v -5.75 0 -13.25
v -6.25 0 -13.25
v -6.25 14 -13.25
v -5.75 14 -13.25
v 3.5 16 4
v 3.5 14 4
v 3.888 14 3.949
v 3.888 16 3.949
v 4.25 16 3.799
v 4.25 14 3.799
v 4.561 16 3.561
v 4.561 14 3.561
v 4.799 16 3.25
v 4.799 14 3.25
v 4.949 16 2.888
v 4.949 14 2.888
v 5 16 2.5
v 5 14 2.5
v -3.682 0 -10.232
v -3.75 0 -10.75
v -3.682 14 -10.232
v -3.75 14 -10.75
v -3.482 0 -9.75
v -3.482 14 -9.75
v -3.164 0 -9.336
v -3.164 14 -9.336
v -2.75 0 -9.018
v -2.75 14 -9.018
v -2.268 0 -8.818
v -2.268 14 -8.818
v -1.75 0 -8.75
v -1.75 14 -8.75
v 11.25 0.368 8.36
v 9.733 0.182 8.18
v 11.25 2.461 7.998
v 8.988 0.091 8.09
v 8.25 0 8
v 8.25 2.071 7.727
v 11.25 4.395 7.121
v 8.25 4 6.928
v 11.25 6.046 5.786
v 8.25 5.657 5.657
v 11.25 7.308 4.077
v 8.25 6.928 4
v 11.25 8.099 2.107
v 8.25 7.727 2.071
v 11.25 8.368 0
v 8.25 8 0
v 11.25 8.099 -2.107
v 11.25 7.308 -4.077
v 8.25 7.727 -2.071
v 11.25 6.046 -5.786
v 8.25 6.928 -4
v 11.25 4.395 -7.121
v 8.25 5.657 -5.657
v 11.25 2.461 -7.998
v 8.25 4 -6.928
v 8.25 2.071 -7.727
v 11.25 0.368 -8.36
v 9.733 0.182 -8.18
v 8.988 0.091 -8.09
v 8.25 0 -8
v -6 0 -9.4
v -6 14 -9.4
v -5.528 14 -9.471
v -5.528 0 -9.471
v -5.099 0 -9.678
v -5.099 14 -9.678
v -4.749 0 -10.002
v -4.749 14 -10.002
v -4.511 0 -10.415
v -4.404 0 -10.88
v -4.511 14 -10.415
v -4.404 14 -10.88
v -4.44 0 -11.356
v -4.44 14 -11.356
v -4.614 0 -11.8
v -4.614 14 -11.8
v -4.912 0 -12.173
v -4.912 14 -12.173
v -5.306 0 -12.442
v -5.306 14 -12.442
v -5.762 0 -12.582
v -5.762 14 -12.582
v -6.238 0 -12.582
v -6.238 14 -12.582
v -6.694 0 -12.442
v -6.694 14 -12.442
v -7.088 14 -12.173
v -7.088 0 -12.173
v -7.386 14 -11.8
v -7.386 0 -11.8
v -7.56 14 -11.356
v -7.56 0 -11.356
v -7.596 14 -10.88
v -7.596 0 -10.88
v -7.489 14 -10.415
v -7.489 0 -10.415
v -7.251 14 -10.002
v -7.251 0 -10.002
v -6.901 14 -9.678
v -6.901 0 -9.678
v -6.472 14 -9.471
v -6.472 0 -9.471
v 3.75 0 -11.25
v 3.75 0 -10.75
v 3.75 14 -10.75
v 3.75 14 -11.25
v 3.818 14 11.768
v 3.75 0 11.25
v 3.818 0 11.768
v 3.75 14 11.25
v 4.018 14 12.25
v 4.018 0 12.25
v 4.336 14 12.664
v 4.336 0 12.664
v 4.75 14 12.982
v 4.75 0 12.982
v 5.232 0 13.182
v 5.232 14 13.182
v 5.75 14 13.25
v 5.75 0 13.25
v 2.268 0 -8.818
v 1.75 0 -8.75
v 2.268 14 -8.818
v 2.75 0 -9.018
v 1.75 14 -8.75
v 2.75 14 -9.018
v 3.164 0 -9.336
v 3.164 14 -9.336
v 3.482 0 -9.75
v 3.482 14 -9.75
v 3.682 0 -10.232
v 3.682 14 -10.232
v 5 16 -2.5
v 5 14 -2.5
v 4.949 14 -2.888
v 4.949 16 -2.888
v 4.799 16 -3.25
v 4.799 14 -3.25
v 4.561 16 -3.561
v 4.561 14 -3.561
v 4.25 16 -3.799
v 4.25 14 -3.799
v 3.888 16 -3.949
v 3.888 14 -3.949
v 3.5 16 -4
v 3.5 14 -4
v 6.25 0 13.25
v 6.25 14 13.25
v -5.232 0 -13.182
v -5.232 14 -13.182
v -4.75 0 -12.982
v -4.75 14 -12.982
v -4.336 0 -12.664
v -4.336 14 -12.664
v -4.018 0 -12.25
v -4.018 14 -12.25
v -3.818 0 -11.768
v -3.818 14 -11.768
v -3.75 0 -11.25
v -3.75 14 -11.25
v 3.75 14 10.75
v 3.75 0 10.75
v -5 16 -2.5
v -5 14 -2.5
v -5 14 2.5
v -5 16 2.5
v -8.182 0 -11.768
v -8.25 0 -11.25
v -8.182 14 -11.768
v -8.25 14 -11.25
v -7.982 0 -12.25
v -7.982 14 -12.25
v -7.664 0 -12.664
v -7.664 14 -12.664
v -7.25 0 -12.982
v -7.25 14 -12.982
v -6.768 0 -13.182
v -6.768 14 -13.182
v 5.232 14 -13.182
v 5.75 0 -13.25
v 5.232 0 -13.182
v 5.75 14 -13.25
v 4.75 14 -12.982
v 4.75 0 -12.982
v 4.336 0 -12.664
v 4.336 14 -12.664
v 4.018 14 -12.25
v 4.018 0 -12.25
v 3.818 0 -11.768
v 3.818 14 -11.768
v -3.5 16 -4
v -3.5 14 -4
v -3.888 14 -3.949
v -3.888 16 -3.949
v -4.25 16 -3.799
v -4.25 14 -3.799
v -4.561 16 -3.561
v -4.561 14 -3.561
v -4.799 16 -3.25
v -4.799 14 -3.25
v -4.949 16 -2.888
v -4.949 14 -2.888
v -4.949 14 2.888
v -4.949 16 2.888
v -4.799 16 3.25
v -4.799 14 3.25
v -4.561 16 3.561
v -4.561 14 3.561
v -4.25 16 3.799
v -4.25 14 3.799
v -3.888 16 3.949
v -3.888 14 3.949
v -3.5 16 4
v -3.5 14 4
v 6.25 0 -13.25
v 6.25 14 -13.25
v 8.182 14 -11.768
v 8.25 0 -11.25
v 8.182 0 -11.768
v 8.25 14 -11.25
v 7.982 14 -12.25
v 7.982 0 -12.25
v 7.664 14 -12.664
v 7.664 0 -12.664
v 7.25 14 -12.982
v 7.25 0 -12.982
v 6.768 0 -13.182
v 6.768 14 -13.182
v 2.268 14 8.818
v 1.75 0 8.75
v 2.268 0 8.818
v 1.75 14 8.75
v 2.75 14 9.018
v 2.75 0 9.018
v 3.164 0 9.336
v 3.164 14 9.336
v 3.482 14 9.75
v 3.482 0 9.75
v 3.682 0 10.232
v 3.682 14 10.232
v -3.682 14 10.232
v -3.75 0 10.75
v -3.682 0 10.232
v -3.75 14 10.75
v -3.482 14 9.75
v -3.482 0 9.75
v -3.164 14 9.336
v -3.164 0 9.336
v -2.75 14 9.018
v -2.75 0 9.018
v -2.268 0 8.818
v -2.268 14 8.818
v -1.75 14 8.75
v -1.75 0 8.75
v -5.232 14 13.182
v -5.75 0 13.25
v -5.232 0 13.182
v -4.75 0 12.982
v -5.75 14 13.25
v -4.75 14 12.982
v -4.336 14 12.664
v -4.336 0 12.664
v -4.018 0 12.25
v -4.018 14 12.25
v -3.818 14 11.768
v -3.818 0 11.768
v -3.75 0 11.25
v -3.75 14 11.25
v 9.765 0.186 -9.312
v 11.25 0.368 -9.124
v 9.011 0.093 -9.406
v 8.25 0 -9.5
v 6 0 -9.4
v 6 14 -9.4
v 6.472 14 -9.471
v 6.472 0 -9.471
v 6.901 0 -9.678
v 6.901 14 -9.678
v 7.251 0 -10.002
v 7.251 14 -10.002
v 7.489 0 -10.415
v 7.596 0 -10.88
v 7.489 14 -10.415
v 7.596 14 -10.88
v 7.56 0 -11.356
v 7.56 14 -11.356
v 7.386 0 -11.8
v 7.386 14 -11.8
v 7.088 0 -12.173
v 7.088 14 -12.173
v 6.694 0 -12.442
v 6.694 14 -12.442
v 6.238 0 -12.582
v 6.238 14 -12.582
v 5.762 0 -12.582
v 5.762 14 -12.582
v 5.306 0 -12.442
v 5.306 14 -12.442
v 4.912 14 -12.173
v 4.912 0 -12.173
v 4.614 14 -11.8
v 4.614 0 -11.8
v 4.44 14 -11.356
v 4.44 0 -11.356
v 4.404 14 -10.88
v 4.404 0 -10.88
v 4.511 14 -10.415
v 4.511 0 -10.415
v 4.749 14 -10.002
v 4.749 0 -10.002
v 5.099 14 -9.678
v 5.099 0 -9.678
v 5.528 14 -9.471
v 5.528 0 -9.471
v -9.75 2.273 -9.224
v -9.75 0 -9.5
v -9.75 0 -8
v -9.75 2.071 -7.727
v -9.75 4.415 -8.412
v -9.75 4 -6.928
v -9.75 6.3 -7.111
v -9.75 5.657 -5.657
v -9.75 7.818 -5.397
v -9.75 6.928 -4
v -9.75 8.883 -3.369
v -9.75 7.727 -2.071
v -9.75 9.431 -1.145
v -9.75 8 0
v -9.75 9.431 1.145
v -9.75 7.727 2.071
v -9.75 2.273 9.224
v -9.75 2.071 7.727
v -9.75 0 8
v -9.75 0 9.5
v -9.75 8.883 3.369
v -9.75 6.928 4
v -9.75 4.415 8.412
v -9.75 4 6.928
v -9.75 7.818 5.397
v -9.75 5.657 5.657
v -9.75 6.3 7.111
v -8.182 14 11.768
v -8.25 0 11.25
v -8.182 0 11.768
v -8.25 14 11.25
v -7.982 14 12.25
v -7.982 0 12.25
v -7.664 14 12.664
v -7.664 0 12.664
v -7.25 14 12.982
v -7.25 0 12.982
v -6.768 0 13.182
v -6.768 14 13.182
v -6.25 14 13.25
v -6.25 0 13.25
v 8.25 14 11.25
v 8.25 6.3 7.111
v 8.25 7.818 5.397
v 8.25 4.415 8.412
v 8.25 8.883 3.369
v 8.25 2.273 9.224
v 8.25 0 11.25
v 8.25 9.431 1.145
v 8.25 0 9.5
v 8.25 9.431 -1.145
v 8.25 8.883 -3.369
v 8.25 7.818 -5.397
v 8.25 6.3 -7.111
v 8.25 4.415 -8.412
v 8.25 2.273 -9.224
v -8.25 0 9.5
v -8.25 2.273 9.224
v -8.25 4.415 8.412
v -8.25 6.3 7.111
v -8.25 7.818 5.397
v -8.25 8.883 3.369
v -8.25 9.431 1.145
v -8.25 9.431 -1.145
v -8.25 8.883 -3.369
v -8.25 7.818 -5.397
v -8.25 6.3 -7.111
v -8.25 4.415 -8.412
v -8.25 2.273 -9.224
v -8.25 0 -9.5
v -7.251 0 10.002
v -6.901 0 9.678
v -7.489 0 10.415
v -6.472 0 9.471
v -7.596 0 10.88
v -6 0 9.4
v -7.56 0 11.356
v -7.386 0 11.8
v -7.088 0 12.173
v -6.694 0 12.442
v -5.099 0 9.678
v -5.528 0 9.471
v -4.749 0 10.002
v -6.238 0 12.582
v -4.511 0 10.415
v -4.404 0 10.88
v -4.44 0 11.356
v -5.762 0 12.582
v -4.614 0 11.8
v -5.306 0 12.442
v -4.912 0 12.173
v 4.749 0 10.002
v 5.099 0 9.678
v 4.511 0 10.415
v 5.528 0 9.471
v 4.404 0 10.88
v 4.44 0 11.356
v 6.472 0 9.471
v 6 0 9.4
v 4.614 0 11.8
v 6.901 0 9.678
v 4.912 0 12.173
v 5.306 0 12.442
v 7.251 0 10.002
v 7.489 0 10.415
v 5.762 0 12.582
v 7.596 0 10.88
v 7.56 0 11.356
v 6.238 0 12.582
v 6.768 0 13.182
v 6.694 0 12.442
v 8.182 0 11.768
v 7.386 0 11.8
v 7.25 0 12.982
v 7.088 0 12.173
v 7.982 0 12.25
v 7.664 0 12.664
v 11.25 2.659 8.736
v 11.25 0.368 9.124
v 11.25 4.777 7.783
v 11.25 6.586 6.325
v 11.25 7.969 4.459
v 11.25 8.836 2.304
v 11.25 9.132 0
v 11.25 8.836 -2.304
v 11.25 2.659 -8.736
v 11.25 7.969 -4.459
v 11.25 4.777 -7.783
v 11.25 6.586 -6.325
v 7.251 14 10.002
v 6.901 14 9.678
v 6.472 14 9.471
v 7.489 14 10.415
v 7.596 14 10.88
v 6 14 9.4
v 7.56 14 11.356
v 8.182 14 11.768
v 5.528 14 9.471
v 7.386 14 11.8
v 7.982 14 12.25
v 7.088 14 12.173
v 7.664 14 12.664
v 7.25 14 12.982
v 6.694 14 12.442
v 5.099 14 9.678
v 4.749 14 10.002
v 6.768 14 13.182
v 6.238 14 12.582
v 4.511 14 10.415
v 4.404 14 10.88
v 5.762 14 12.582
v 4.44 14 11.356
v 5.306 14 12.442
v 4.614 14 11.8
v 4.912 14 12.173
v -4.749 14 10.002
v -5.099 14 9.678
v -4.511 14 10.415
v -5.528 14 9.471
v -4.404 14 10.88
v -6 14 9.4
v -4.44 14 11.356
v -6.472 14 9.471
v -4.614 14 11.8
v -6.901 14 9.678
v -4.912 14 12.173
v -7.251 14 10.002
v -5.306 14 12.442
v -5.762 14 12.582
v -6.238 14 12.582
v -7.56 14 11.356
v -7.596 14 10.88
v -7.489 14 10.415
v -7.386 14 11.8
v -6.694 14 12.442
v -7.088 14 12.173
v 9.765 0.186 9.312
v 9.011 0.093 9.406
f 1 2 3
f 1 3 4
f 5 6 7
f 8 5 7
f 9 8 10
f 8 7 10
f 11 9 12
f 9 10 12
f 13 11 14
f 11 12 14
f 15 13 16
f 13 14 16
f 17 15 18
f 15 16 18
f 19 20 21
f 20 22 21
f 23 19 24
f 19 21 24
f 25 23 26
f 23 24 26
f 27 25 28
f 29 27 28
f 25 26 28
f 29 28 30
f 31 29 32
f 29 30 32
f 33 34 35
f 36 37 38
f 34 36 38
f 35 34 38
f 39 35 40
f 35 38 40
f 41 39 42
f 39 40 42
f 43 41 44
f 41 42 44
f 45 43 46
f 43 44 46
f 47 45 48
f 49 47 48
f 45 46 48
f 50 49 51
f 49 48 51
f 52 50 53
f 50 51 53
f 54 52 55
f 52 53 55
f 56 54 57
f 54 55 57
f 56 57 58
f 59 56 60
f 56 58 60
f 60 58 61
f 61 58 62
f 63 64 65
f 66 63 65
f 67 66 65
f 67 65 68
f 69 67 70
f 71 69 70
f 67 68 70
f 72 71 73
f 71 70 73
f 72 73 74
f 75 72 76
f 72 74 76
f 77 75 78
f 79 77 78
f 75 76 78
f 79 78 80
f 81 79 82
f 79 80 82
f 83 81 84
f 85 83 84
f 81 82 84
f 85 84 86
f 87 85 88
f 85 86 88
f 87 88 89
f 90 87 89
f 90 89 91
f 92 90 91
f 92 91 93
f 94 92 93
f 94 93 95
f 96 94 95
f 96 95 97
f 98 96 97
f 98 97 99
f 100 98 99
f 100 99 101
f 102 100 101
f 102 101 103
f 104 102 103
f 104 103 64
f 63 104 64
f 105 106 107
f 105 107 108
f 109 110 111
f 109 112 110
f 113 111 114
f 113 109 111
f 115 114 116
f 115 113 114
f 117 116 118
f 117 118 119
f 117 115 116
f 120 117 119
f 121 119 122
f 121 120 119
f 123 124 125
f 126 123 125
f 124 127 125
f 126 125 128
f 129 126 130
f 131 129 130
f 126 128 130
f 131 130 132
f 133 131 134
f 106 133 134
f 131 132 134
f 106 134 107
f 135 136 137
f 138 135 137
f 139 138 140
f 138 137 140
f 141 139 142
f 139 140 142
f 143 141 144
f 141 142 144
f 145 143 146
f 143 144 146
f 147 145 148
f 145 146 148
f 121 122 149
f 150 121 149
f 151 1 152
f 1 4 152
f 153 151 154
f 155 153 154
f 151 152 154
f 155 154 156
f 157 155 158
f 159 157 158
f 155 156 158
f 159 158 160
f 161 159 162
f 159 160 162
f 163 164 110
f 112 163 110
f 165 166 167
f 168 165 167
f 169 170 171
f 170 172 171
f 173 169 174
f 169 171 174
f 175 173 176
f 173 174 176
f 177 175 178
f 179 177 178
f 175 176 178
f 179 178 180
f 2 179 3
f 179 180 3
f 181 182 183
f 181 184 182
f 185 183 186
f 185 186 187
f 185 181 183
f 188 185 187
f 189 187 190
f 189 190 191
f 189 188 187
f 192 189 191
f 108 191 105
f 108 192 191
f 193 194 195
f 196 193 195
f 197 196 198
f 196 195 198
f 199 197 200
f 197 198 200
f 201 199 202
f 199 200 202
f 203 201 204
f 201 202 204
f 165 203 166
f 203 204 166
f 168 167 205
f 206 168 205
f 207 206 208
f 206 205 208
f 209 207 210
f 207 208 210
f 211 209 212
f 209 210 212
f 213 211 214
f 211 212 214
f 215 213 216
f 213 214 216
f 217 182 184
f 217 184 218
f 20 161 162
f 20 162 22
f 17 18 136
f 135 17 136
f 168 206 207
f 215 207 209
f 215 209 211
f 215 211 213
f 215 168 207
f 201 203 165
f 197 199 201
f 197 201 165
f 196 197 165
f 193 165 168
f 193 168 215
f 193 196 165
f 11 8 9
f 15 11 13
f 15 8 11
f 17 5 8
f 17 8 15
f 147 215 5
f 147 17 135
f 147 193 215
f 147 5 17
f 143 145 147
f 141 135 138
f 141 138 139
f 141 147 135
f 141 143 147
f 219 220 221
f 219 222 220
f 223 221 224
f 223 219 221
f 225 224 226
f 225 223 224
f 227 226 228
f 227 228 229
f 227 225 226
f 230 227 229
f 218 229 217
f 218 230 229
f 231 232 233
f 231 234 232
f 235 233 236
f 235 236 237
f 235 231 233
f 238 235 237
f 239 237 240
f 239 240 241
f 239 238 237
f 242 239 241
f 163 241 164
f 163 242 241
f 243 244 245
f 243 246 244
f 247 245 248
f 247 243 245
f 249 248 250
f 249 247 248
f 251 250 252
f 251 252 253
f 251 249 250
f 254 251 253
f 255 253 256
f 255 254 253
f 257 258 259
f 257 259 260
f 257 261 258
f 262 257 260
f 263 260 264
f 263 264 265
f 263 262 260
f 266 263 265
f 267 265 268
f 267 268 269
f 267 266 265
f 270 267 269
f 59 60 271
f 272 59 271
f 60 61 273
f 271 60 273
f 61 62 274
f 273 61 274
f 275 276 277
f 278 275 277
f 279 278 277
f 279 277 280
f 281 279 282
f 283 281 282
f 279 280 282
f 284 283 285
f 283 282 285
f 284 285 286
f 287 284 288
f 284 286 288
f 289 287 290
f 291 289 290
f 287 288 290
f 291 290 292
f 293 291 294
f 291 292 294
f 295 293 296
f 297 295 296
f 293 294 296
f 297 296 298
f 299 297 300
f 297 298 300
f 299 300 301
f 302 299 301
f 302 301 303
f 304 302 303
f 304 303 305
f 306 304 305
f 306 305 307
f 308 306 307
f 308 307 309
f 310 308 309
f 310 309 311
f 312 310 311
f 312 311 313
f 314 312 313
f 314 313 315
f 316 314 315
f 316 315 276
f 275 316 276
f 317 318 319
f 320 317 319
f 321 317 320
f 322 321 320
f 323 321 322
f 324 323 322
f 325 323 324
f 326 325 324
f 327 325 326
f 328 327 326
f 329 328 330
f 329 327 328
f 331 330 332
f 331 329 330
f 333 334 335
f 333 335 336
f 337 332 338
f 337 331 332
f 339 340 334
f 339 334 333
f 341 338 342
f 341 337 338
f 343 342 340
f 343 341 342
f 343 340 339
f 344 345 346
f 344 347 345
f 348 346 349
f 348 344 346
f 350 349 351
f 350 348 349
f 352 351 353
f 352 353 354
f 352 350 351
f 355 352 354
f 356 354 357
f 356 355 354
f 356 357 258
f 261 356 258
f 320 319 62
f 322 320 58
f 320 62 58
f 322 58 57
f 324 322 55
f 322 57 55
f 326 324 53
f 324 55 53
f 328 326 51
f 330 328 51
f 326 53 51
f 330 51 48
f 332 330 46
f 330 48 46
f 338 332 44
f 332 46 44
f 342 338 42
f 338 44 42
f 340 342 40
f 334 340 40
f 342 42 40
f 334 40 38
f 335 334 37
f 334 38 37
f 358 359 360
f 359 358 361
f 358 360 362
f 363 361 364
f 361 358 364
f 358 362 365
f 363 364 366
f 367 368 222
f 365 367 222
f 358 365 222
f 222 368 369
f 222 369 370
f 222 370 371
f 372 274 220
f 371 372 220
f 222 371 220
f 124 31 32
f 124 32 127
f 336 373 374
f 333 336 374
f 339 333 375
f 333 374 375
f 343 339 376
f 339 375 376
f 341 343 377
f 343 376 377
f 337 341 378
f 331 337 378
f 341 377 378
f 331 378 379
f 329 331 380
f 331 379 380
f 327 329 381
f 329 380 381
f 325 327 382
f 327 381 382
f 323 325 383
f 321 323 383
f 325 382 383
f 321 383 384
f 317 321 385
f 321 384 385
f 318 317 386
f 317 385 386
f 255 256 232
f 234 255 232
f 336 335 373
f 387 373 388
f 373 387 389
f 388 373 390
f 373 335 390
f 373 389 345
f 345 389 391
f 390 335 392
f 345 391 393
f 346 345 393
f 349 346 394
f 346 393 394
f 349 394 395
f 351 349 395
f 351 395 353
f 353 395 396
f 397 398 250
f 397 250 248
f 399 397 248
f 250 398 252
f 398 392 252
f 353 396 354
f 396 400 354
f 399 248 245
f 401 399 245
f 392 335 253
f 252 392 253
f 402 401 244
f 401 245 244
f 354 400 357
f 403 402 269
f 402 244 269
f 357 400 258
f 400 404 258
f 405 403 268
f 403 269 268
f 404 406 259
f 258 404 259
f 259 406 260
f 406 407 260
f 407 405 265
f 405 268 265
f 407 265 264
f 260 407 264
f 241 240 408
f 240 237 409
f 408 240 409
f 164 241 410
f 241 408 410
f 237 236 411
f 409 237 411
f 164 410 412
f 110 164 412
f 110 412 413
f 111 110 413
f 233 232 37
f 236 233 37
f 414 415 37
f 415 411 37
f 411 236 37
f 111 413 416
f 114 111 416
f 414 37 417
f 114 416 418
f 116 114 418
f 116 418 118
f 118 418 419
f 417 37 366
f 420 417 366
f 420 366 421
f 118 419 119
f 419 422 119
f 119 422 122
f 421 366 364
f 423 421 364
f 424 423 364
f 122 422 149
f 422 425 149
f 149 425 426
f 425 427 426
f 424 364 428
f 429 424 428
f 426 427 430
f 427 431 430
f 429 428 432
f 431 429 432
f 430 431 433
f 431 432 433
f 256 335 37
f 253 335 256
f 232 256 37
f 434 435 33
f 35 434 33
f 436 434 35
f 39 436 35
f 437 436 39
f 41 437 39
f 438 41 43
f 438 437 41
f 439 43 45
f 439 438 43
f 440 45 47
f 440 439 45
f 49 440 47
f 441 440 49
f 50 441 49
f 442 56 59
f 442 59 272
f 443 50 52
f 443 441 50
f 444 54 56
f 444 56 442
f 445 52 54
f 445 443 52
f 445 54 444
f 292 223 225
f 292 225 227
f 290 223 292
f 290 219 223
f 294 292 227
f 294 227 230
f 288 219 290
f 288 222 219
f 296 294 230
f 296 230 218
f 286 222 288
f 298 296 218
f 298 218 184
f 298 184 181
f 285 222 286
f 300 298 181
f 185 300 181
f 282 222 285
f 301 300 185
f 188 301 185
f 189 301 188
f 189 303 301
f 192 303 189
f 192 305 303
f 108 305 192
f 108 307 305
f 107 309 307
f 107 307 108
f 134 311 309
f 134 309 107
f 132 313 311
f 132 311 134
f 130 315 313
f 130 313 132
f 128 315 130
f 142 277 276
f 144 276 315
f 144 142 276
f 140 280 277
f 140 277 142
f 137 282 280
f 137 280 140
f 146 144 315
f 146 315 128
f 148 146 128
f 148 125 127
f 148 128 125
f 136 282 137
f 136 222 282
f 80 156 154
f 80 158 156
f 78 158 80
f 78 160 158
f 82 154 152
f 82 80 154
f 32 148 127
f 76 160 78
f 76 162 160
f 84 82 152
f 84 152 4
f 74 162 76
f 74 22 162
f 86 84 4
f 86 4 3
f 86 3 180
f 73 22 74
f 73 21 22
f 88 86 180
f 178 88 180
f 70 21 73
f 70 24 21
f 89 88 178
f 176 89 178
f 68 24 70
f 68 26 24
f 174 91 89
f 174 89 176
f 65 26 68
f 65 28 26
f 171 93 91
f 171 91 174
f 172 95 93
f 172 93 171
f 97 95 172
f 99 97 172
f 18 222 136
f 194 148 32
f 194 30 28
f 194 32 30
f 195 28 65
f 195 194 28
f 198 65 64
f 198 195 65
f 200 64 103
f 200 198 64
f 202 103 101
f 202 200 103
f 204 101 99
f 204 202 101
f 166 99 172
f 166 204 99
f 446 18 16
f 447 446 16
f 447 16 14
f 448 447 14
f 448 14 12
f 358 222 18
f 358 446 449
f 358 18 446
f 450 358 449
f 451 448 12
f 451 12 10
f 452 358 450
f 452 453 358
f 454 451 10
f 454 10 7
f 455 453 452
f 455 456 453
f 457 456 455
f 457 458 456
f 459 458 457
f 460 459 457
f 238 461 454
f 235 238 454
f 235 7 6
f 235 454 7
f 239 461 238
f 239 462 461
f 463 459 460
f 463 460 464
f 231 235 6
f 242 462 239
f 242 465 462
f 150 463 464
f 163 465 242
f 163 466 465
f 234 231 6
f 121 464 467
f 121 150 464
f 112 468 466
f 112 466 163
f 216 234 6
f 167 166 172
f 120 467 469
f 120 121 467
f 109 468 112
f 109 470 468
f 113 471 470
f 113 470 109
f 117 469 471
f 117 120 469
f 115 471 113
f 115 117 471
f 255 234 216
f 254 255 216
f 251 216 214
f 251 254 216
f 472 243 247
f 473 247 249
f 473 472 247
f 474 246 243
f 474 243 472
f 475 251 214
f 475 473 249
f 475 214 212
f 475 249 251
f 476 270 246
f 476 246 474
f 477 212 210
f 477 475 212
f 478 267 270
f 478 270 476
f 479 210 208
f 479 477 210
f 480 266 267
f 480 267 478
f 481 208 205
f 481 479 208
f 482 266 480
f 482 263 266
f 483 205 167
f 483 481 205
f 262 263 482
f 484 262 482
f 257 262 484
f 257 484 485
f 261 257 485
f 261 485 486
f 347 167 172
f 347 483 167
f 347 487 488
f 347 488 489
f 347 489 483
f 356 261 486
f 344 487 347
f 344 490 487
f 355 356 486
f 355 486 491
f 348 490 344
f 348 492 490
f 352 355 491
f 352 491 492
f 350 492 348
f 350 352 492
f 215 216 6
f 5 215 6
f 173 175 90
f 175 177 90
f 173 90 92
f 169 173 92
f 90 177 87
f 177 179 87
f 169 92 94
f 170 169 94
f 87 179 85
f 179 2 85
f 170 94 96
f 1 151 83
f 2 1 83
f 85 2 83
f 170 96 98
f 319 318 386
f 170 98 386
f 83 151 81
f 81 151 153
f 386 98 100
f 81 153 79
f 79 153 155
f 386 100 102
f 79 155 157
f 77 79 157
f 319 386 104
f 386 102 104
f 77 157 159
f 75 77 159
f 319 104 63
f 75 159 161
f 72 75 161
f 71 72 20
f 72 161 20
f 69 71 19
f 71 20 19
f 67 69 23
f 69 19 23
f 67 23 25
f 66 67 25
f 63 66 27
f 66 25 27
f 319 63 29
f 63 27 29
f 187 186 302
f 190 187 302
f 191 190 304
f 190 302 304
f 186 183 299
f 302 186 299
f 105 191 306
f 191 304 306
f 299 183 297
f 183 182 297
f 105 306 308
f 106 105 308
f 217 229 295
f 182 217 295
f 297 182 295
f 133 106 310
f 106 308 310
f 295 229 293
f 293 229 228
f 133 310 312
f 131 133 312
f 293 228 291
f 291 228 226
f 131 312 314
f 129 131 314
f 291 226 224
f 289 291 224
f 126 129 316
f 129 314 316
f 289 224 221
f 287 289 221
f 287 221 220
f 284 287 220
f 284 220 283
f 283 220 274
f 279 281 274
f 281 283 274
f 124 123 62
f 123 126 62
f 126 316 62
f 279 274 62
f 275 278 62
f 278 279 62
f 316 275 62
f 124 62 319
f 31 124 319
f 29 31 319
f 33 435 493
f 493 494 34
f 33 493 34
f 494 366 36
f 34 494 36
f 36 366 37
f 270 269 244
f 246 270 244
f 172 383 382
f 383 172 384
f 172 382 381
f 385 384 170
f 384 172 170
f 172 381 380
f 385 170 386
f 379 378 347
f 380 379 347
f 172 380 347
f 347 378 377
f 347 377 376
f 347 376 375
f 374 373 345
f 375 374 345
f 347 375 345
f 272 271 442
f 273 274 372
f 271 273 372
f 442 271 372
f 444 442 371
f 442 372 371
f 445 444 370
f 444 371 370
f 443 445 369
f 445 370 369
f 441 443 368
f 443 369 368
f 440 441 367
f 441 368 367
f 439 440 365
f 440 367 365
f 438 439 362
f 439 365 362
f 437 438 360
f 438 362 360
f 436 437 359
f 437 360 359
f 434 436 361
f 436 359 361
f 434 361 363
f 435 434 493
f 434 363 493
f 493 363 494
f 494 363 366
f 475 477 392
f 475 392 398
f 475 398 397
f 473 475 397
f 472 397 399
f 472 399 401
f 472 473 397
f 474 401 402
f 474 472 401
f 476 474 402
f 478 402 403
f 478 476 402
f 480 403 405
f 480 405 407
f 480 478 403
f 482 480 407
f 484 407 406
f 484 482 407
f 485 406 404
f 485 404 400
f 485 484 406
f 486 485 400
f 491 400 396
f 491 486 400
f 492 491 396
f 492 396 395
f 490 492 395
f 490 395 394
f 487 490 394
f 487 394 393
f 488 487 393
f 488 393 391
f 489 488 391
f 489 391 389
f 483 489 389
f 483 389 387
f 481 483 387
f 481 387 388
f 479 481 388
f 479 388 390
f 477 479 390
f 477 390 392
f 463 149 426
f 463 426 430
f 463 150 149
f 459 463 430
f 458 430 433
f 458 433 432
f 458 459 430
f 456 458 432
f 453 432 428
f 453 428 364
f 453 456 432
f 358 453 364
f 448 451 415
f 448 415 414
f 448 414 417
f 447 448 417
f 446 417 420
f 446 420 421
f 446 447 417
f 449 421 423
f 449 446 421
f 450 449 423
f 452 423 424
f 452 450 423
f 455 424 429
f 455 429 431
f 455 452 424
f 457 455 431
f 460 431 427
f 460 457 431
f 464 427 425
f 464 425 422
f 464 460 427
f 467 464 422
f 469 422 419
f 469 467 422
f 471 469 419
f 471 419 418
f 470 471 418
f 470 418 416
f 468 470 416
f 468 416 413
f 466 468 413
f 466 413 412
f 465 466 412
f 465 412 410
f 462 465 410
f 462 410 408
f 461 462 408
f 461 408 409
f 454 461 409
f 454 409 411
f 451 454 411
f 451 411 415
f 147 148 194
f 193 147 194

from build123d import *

# Parameters (mm, degrees)
BOSS_EXTRUDE1_DEPTH  = 14
CUT_EXTRUDE1_REACH   = 22.967
SKETCH2_R            = 1.6
FILLET2_R            = 2
FILLET2_OF_MIRROR1_R = 2
BOSS_EXTRUDE2_DEPTH  = 2
CUT_EXTRUDE2_REACH   = 28.529
BOSS_EXTRUDE3_DEPTH  = 3
BOSS_EXTRUDE3_DRAFT  = 7
BOSS_EXTRUDE4_DEPTH  = 1.5


with BuildPart() as part:
    # Sketch1 → Boss-Extrude1 (new body)
    with BuildSketch(Plane(origin=(0, 0, 0), x_dir=(1, 0, 0), z_dir=(0, 1, 0))):
        Polygon((-8.25, 0), (-8.25, 13.25), (-3.75, 13.25), (-3.75, 8.75), (3.75, 8.75), (3.75, 13.25), (8.25, 13.25), (8.25, 0), align=None)
    boss_extrude1 = extrude(amount=BOSS_EXTRUDE1_DEPTH)

    # Sketch2 → Cut-Extrude1 (cut, up to next)
    with BuildSketch(Plane(origin=(0, 14, 0), x_dir=(1, 0, 0), z_dir=(0, 1, 0)), mode=Mode.PRIVATE) as cut_extrude1_sk1:
        with Locations(Location((-6, 11, 0), (0, 0, 270))):
            Circle(SKETCH2_R)
    cut_extrude1_tool1 = extrude(cut_extrude1_sk1.sketch, amount=-CUT_EXTRUDE1_REACH, mode=Mode.PRIVATE) & part.part
    # Sketch2 → Cut-Extrude1 (cut, up to next)
    with BuildSketch(Plane(origin=(0, 14, 0), x_dir=(1, 0, 0), z_dir=(0, 1, 0)), mode=Mode.PRIVATE) as cut_extrude1_sk2:
        with Locations(Location((6, 11, 0), (0, 0, 270))):
            Circle(SKETCH2_R)
    cut_extrude1_tool2 = extrude(cut_extrude1_sk2.sketch, amount=-CUT_EXTRUDE1_REACH, mode=Mode.PRIVATE) & part.part
    cut_extrude1_1 = cut_extrude1_tool1.solids().sort_by_distance((-6, 14, -11))[0]
    add(cut_extrude1_1, mode=Mode.SUBTRACT)
    cut_extrude1_2 = cut_extrude1_tool2.solids().sort_by_distance((6, 14, -11))[0]
    add(cut_extrude1_2, mode=Mode.SUBTRACT)
    cut_extrude1 = cut_extrude1_1 + cut_extrude1_2  # Cut-Extrude1 as one shape, for the pattern or mirror that repeats it

    # Fillet2
    fillet2_edges = [part.edges().sort_by_distance(p)[0] for p in [
        (-8.25, 7, -13.25),
        (-3.75, 7, -13.25),
        (-3.75, 7, -8.75),
        (3.75, 7, -8.75),
        (3.75, 7, -13.25),
        (8.25, 7, -13.25),
    ]]
    fillet(fillet2_edges, radius=FILLET2_R)

    # Mirror1: Boss-Extrude1, Cut-Extrude1 across plane
    add(boss_extrude1.mirror(Plane.XY))
    add(cut_extrude1.mirror(Plane.XY), mode=Mode.SUBTRACT)

    # Fillet2 of Mirror1
    fillet2_of_mirror1_edges = [part.edges().sort_by_distance(p)[0] for p in [
        (-8.25, 7, 13.25),
        (-3.75, 7, 13.25),
        (-3.75, 7, 8.75),
        (3.75, 7, 8.75),
        (3.75, 7, 13.25),
        (8.25, 7, 13.25),
    ]]
    fillet(fillet2_of_mirror1_edges, radius=FILLET2_OF_MIRROR1_R)

    # Sketch3 → Boss-Extrude2 (add)
    with BuildSketch(Plane(origin=(0, 14, 0), x_dir=(1, 0, 0), z_dir=(0, 1, 0))):
        with BuildLine():
            Line((-3.5, -4), (3.5, -4))
            ThreePointArc((3.5, -4), (4.560660172, -3.560660172), (5, -2.5))
            Line((5, -2.5), (5, 2.5))
            ThreePointArc((5, 2.5), (4.560660172, 3.560660172), (3.5, 4))
            Line((3.5, 4), (-3.5, 4))
            ThreePointArc((-3.5, 4), (-4.560660172, 3.560660172), (-5, 2.5))
            Line((-5, 2.5), (-5, -2.5))
            ThreePointArc((-5, -2.5), (-4.560660172, -3.560660172), (-3.5, -4))
        make_face()
    extrude(amount=BOSS_EXTRUDE2_DEPTH)

    # Sketch4 → Cut-Extrude2 (cut, up to next)
    with BuildSketch(Plane(origin=(8.25, 0, 0), x_dir=(0, 0, -1), z_dir=(1, 0, 0)), mode=Mode.PRIVATE) as cut_extrude2_sk1:
        with BuildLine():
            Line((-8, 0), (8, 0))
            ThreePointArc((8, 0), (0, 8), (-8, 0))
        make_face()
    cut_extrude2_tool1 = extrude(cut_extrude2_sk1.sketch, amount=-CUT_EXTRUDE2_REACH, mode=Mode.PRIVATE) & part.part
    add(cut_extrude2_tool1.solids().sort_by_distance((8.25, 3.395305, 0))[0], mode=Mode.SUBTRACT)


with BuildPart() as boss_extrude3_tool:
    # Sketch5 → Boss-Extrude3 (with draft: the straight prism first)
    with BuildSketch(Plane(origin=(8.25, 0, 0), x_dir=(0, 0, -1), z_dir=(1, 0, 0))):
        with BuildLine():
            Line((-9.5, 0), (-8, 0))
            ThreePointArc((-8, 0), (0, 8), (8, 0))
            Line((8, 0), (9.5, 0))
            ThreePointArc((9.5, 0), (0, 9.5), (-9.5, 0))
        make_face()
    extrude(amount=BOSS_EXTRUDE3_DEPTH)
    # Boss-Extrude3: the draft: its side faces are tilted about the plane it starts from
    boss_extrude3_sides = [boss_extrude3_tool.faces().sort_by_distance(p)[0] for p in [
        (9.75, 0, 8.75),
        (9.75, 8, 0),
        (9.75, 0, -8.75),
        (9.75, 9.5, 0),
    ]]
    draft(boss_extrude3_sides, Plane(origin=(8.25, 0, 0), x_dir=(0, 0, -1), z_dir=(1, 0, 0)), BOSS_EXTRUDE3_DRAFT)


with BuildPart() as part_1:
    add(part.part)

    # Boss-Extrude3: add boss_extrude3_tool
    add(boss_extrude3_tool.part)

    # Sketch6 → Boss-Extrude4 (add)
    with BuildSketch(Plane.ZY.offset(8.25)):
        with BuildLine():
            Line((-9.5, 0), (-8, 0))
            ThreePointArc((-8, 0), (0, 8), (8, 0))
            Line((8, 0), (9.5, 0))
            ThreePointArc((9.5, 0), (0, 9.5), (-9.5, 0))
        make_face()
    extrude(amount=BOSS_EXTRUDE4_DEPTH)


solid = part_1.part
